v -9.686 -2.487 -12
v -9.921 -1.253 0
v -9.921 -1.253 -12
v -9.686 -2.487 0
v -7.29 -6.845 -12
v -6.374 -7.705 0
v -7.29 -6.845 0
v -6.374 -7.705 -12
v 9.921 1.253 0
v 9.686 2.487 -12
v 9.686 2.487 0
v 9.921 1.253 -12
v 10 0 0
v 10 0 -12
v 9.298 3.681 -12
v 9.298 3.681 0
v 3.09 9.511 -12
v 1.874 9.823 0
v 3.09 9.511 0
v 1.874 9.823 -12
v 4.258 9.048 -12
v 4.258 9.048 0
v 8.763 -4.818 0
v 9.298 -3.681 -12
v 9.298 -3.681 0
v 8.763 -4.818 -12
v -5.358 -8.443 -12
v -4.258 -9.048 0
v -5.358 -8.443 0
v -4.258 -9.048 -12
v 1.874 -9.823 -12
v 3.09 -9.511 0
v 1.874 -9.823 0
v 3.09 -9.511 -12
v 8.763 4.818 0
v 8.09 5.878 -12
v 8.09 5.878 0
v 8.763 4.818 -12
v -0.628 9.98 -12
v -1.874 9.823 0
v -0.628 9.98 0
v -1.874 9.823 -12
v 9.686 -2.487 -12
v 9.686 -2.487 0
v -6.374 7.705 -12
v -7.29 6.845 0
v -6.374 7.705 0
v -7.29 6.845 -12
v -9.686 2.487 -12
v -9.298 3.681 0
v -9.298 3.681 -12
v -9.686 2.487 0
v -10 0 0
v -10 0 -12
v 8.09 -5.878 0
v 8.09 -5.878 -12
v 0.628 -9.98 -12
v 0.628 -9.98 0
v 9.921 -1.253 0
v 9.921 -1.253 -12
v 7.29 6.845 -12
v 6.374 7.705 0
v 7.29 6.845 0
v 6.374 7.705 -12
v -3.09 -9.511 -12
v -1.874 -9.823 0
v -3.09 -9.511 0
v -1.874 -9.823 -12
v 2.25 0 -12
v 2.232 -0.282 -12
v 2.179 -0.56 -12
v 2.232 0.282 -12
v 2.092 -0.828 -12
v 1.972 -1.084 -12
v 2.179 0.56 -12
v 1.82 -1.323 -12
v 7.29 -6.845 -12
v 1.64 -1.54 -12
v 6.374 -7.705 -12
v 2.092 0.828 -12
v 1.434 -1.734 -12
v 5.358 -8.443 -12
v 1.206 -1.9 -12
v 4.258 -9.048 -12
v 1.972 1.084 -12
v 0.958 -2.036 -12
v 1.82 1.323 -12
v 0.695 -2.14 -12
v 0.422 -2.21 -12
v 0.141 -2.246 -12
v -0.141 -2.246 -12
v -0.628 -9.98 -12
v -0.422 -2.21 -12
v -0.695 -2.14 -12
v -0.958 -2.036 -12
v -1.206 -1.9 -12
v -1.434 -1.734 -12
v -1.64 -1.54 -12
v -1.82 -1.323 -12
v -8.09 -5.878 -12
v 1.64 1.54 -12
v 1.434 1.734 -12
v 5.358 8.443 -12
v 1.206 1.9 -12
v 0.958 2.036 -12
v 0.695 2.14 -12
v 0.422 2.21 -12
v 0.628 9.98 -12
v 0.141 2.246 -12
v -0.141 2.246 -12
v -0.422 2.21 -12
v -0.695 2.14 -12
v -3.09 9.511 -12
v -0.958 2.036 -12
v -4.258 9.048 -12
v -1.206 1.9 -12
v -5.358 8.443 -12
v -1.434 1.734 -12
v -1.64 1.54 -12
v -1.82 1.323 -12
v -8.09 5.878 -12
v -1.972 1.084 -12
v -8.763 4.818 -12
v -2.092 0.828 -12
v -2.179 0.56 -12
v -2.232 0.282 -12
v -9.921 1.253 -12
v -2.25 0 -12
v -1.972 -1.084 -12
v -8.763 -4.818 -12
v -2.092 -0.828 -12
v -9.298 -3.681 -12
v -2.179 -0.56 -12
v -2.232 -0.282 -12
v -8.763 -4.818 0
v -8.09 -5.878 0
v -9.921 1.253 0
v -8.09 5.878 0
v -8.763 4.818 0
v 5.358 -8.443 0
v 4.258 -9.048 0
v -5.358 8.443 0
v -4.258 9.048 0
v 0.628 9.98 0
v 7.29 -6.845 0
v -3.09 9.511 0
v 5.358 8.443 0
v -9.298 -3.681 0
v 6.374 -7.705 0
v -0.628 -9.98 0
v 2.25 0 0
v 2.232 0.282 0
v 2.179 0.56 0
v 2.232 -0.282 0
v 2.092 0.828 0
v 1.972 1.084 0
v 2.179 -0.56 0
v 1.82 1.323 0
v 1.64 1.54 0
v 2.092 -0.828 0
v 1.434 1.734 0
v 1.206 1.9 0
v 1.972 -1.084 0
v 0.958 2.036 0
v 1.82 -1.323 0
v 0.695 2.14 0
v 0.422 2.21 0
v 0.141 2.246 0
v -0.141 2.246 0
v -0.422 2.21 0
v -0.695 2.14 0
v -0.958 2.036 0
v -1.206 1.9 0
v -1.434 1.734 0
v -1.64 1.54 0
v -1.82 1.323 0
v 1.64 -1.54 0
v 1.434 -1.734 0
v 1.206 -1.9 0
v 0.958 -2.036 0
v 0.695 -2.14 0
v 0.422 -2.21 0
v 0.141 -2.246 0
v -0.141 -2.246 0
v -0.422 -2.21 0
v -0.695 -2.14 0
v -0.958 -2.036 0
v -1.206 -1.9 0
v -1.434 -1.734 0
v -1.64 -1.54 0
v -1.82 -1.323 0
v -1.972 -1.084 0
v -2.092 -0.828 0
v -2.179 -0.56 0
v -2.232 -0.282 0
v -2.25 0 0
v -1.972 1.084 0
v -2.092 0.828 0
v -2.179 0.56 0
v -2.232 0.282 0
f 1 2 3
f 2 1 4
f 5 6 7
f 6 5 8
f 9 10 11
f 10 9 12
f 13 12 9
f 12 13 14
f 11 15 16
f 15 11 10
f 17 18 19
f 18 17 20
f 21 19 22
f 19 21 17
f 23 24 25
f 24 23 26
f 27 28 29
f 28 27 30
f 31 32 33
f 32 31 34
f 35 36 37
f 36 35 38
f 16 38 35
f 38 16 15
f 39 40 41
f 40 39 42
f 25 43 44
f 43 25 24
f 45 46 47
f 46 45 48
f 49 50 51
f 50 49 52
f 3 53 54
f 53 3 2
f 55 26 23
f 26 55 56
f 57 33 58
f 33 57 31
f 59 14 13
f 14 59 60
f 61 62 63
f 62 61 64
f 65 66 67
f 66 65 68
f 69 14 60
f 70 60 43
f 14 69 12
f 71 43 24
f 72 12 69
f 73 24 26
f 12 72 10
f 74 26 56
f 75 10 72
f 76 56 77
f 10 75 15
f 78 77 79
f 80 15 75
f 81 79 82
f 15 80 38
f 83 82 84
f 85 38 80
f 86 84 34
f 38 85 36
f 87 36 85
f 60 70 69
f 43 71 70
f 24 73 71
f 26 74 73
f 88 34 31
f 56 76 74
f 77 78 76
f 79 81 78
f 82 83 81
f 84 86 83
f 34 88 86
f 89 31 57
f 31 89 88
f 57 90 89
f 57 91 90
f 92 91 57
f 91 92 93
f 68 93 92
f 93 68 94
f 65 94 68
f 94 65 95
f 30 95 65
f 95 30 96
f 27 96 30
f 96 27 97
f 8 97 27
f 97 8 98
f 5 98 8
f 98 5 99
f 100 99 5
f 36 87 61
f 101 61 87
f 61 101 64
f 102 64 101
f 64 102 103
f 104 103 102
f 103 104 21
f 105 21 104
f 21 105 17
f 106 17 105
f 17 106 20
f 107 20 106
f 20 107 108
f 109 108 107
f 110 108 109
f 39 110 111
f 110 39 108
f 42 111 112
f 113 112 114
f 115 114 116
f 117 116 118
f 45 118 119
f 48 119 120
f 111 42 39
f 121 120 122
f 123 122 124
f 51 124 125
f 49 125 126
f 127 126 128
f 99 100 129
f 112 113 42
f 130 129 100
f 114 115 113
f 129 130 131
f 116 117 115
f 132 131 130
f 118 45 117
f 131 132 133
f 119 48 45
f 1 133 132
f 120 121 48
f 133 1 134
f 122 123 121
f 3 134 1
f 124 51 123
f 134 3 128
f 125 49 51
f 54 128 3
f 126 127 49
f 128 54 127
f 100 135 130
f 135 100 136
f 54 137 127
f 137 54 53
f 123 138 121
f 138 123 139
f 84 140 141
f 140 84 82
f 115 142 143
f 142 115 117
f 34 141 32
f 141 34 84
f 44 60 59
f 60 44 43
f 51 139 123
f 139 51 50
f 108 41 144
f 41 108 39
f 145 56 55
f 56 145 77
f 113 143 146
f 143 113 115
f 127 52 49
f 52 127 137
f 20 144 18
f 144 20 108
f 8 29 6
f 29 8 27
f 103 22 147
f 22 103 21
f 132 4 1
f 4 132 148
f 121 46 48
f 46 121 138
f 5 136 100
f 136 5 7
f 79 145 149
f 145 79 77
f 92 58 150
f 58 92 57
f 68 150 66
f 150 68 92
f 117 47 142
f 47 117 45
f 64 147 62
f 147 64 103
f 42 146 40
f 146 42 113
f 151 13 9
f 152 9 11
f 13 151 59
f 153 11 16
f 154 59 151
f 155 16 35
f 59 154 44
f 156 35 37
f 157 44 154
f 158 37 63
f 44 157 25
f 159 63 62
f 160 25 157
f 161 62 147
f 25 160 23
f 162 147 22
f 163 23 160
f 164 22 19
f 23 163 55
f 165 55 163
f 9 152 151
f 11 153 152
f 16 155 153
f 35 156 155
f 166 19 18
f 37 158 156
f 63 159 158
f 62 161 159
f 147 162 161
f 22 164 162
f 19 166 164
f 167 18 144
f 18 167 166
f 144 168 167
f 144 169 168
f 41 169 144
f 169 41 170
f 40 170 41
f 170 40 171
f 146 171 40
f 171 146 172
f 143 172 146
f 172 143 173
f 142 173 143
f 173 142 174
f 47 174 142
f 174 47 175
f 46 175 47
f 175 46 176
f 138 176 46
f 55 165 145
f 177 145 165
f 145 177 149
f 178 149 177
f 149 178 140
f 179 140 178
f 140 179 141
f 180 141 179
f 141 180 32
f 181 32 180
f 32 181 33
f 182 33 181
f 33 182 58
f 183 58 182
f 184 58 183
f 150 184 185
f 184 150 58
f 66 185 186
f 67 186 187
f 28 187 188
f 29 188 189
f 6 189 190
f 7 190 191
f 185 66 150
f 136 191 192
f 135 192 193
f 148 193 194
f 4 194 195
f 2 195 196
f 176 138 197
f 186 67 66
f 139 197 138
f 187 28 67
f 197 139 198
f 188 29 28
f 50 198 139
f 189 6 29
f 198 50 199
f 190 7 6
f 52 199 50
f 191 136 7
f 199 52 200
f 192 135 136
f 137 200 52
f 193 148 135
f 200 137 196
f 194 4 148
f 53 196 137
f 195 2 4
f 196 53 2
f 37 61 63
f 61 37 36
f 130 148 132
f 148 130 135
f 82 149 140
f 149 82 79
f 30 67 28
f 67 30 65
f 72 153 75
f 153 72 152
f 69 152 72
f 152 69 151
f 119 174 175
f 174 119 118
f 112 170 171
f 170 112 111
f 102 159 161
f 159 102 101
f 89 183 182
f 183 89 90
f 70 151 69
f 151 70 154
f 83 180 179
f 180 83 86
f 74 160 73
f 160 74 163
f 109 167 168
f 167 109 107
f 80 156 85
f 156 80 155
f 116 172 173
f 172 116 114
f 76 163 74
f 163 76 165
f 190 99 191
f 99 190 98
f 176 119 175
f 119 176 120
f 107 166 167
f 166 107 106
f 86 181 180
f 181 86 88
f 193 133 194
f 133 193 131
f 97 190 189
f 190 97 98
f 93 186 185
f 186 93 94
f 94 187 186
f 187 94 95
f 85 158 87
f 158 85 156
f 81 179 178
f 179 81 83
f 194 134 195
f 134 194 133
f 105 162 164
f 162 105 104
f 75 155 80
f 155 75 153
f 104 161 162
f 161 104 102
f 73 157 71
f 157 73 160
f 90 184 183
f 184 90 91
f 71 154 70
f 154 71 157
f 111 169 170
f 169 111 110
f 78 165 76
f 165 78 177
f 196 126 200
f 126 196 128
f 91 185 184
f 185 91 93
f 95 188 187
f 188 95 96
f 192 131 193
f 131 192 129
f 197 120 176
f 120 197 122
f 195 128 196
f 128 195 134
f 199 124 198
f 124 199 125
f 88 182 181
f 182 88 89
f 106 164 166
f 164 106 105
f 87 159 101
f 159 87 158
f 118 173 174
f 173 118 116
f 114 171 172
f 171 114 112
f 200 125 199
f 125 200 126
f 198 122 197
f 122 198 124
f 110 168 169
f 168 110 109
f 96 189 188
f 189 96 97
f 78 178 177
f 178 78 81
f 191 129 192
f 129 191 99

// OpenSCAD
$fn = 50;


difference() {
	union() {
		translate(v = [0, 0, -12.0000000000]) {
			cylinder(h = 12, r = 10.0000000000);
		}
		cylinder(h = 0, r = 13.0000000000);
	}
	union() {
		#translate(v = [0, 0, -12]) {
			cylinder(h = 12, r = 2.2500000000);
		}
	}
}
